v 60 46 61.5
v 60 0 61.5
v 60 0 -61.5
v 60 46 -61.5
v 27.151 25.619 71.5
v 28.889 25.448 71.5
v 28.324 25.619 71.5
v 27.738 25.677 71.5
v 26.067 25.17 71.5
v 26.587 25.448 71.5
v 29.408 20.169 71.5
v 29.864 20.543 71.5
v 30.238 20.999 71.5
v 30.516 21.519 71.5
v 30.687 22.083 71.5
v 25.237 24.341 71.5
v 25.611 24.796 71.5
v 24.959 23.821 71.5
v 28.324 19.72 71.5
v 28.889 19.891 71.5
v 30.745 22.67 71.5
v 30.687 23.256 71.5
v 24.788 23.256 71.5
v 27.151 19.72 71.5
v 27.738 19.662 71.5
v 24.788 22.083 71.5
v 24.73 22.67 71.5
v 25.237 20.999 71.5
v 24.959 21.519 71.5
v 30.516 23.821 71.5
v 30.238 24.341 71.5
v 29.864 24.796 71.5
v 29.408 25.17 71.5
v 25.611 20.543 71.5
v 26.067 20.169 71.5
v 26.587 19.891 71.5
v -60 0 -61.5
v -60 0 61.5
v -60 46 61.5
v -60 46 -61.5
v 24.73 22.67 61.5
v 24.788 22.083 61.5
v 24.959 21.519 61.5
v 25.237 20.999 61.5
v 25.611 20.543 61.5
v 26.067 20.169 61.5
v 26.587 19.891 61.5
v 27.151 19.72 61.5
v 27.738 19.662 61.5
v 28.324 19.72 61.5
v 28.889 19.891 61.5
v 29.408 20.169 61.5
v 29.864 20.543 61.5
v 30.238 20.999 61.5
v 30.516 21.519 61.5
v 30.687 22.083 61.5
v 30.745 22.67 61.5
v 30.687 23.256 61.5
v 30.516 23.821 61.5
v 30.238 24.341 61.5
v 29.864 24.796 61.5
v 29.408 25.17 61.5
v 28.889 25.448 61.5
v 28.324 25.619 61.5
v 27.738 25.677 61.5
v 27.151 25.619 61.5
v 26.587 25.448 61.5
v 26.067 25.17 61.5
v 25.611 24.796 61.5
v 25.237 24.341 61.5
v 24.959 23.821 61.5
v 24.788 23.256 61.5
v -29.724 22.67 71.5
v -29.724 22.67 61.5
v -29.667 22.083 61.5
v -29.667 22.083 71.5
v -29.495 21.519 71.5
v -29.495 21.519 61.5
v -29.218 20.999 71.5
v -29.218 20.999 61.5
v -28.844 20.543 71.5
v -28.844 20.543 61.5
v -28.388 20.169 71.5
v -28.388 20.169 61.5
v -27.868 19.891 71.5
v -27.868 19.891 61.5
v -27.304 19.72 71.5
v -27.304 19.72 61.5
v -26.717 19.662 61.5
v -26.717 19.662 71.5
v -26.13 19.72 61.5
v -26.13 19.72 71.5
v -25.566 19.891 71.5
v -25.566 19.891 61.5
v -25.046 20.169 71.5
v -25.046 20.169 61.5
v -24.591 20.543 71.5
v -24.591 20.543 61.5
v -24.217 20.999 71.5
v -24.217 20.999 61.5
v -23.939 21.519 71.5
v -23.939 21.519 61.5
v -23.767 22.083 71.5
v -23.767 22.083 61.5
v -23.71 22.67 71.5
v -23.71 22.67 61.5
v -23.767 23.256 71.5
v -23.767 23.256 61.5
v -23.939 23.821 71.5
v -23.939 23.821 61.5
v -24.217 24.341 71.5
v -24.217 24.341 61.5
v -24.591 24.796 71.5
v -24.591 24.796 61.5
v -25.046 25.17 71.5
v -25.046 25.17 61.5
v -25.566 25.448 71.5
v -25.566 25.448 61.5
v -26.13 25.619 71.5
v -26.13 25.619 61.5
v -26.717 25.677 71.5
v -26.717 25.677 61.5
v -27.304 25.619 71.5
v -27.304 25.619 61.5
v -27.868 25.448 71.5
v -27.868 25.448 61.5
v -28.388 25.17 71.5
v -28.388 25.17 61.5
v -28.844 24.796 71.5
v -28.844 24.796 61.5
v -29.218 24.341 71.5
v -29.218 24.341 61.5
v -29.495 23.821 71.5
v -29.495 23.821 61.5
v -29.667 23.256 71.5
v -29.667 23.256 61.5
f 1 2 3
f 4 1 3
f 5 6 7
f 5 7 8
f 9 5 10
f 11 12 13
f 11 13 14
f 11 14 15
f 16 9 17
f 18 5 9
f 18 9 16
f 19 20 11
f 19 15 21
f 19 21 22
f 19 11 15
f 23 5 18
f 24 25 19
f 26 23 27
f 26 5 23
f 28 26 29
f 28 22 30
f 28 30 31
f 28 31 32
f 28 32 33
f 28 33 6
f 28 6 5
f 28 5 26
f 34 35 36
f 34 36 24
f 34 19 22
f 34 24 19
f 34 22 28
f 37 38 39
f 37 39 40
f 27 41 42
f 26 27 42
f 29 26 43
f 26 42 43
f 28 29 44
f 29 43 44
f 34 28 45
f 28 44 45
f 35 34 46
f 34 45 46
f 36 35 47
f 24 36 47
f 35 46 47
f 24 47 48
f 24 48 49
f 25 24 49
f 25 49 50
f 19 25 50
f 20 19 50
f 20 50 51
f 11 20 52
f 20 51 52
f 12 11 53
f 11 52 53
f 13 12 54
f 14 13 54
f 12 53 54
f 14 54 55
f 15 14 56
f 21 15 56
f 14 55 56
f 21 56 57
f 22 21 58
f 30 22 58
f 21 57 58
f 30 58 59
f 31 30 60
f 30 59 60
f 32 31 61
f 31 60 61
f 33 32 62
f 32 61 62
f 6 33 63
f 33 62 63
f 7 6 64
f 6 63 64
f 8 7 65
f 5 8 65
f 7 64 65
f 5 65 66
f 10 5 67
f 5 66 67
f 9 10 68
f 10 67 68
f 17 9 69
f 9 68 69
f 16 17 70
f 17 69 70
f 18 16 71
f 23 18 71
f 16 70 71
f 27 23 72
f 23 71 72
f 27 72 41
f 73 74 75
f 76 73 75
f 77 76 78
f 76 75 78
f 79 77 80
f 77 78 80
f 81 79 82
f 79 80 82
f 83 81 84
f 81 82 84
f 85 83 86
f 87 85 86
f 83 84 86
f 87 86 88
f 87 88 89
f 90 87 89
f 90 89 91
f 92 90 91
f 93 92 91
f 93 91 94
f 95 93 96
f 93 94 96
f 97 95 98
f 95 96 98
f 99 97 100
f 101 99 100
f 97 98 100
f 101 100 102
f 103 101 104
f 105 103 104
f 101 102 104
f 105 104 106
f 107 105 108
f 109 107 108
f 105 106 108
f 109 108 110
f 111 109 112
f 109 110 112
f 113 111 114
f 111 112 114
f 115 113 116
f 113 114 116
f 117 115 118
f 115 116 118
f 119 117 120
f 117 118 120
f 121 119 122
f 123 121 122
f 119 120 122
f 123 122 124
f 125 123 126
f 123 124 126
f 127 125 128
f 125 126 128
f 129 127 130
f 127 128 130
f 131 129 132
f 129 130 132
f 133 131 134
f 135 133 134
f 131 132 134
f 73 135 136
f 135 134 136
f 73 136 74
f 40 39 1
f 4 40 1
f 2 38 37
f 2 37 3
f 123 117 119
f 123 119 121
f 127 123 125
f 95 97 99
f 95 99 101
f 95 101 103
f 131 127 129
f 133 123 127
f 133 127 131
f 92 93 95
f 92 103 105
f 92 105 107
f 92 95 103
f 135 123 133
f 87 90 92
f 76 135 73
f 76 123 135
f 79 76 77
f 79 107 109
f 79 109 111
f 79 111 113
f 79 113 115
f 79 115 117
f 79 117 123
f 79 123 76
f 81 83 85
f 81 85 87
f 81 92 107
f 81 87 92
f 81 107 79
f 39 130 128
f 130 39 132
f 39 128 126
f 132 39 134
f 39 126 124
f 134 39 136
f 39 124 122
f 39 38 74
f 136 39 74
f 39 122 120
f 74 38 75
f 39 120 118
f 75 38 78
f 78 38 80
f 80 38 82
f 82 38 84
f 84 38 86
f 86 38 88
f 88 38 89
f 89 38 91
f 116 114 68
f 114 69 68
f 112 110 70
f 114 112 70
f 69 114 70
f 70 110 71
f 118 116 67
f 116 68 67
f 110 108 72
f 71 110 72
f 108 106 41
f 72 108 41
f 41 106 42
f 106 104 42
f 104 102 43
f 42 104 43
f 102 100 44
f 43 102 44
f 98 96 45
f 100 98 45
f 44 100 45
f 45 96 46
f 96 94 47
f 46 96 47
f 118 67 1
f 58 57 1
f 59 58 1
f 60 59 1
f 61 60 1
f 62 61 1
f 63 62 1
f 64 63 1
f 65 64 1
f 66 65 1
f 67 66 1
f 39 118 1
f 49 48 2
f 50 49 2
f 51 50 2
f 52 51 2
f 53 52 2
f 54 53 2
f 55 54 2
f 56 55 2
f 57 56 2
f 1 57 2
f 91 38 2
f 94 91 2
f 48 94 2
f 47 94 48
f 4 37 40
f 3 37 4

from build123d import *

# Parameters (mm, degrees)
SKIZZE1_W                       = 120
SKIZZE1_H                       = 123
AUFSATZ_LINEAR_AUSTRAGEN1_DEPTH = 46
SKIZZE2_R                       = 3.007311743
AUFSATZ_LINEAR_AUSTRAGEN2_DEPTH = 10


with BuildPart() as part:
    # Skizze1 → Aufsatz-Linear austragen1 (new body)
    with BuildSketch(Plane(origin=(0, 0, 0), x_dir=(1, 0, 0), z_dir=(0, 1, 0))):
        Rectangle(SKIZZE1_W, SKIZZE1_H)
    extrude(amount=AUFSATZ_LINEAR_AUSTRAGEN1_DEPTH)

    # Skizze2 → Aufsatz-Linear austragen2 (add)
    with BuildSketch(Plane.XY.offset(61.5)):
        with Locations(Location((-26.717027071, 22.669789553, 0), (0, 0, 180))):
            Circle(SKIZZE2_R)
        with Locations(Location((27.737677543, 22.669789553, 0), (0, 0, 180))):
            Circle(SKIZZE2_R)
    extrude(amount=AUFSATZ_LINEAR_AUSTRAGEN2_DEPTH)


solid = part.part
